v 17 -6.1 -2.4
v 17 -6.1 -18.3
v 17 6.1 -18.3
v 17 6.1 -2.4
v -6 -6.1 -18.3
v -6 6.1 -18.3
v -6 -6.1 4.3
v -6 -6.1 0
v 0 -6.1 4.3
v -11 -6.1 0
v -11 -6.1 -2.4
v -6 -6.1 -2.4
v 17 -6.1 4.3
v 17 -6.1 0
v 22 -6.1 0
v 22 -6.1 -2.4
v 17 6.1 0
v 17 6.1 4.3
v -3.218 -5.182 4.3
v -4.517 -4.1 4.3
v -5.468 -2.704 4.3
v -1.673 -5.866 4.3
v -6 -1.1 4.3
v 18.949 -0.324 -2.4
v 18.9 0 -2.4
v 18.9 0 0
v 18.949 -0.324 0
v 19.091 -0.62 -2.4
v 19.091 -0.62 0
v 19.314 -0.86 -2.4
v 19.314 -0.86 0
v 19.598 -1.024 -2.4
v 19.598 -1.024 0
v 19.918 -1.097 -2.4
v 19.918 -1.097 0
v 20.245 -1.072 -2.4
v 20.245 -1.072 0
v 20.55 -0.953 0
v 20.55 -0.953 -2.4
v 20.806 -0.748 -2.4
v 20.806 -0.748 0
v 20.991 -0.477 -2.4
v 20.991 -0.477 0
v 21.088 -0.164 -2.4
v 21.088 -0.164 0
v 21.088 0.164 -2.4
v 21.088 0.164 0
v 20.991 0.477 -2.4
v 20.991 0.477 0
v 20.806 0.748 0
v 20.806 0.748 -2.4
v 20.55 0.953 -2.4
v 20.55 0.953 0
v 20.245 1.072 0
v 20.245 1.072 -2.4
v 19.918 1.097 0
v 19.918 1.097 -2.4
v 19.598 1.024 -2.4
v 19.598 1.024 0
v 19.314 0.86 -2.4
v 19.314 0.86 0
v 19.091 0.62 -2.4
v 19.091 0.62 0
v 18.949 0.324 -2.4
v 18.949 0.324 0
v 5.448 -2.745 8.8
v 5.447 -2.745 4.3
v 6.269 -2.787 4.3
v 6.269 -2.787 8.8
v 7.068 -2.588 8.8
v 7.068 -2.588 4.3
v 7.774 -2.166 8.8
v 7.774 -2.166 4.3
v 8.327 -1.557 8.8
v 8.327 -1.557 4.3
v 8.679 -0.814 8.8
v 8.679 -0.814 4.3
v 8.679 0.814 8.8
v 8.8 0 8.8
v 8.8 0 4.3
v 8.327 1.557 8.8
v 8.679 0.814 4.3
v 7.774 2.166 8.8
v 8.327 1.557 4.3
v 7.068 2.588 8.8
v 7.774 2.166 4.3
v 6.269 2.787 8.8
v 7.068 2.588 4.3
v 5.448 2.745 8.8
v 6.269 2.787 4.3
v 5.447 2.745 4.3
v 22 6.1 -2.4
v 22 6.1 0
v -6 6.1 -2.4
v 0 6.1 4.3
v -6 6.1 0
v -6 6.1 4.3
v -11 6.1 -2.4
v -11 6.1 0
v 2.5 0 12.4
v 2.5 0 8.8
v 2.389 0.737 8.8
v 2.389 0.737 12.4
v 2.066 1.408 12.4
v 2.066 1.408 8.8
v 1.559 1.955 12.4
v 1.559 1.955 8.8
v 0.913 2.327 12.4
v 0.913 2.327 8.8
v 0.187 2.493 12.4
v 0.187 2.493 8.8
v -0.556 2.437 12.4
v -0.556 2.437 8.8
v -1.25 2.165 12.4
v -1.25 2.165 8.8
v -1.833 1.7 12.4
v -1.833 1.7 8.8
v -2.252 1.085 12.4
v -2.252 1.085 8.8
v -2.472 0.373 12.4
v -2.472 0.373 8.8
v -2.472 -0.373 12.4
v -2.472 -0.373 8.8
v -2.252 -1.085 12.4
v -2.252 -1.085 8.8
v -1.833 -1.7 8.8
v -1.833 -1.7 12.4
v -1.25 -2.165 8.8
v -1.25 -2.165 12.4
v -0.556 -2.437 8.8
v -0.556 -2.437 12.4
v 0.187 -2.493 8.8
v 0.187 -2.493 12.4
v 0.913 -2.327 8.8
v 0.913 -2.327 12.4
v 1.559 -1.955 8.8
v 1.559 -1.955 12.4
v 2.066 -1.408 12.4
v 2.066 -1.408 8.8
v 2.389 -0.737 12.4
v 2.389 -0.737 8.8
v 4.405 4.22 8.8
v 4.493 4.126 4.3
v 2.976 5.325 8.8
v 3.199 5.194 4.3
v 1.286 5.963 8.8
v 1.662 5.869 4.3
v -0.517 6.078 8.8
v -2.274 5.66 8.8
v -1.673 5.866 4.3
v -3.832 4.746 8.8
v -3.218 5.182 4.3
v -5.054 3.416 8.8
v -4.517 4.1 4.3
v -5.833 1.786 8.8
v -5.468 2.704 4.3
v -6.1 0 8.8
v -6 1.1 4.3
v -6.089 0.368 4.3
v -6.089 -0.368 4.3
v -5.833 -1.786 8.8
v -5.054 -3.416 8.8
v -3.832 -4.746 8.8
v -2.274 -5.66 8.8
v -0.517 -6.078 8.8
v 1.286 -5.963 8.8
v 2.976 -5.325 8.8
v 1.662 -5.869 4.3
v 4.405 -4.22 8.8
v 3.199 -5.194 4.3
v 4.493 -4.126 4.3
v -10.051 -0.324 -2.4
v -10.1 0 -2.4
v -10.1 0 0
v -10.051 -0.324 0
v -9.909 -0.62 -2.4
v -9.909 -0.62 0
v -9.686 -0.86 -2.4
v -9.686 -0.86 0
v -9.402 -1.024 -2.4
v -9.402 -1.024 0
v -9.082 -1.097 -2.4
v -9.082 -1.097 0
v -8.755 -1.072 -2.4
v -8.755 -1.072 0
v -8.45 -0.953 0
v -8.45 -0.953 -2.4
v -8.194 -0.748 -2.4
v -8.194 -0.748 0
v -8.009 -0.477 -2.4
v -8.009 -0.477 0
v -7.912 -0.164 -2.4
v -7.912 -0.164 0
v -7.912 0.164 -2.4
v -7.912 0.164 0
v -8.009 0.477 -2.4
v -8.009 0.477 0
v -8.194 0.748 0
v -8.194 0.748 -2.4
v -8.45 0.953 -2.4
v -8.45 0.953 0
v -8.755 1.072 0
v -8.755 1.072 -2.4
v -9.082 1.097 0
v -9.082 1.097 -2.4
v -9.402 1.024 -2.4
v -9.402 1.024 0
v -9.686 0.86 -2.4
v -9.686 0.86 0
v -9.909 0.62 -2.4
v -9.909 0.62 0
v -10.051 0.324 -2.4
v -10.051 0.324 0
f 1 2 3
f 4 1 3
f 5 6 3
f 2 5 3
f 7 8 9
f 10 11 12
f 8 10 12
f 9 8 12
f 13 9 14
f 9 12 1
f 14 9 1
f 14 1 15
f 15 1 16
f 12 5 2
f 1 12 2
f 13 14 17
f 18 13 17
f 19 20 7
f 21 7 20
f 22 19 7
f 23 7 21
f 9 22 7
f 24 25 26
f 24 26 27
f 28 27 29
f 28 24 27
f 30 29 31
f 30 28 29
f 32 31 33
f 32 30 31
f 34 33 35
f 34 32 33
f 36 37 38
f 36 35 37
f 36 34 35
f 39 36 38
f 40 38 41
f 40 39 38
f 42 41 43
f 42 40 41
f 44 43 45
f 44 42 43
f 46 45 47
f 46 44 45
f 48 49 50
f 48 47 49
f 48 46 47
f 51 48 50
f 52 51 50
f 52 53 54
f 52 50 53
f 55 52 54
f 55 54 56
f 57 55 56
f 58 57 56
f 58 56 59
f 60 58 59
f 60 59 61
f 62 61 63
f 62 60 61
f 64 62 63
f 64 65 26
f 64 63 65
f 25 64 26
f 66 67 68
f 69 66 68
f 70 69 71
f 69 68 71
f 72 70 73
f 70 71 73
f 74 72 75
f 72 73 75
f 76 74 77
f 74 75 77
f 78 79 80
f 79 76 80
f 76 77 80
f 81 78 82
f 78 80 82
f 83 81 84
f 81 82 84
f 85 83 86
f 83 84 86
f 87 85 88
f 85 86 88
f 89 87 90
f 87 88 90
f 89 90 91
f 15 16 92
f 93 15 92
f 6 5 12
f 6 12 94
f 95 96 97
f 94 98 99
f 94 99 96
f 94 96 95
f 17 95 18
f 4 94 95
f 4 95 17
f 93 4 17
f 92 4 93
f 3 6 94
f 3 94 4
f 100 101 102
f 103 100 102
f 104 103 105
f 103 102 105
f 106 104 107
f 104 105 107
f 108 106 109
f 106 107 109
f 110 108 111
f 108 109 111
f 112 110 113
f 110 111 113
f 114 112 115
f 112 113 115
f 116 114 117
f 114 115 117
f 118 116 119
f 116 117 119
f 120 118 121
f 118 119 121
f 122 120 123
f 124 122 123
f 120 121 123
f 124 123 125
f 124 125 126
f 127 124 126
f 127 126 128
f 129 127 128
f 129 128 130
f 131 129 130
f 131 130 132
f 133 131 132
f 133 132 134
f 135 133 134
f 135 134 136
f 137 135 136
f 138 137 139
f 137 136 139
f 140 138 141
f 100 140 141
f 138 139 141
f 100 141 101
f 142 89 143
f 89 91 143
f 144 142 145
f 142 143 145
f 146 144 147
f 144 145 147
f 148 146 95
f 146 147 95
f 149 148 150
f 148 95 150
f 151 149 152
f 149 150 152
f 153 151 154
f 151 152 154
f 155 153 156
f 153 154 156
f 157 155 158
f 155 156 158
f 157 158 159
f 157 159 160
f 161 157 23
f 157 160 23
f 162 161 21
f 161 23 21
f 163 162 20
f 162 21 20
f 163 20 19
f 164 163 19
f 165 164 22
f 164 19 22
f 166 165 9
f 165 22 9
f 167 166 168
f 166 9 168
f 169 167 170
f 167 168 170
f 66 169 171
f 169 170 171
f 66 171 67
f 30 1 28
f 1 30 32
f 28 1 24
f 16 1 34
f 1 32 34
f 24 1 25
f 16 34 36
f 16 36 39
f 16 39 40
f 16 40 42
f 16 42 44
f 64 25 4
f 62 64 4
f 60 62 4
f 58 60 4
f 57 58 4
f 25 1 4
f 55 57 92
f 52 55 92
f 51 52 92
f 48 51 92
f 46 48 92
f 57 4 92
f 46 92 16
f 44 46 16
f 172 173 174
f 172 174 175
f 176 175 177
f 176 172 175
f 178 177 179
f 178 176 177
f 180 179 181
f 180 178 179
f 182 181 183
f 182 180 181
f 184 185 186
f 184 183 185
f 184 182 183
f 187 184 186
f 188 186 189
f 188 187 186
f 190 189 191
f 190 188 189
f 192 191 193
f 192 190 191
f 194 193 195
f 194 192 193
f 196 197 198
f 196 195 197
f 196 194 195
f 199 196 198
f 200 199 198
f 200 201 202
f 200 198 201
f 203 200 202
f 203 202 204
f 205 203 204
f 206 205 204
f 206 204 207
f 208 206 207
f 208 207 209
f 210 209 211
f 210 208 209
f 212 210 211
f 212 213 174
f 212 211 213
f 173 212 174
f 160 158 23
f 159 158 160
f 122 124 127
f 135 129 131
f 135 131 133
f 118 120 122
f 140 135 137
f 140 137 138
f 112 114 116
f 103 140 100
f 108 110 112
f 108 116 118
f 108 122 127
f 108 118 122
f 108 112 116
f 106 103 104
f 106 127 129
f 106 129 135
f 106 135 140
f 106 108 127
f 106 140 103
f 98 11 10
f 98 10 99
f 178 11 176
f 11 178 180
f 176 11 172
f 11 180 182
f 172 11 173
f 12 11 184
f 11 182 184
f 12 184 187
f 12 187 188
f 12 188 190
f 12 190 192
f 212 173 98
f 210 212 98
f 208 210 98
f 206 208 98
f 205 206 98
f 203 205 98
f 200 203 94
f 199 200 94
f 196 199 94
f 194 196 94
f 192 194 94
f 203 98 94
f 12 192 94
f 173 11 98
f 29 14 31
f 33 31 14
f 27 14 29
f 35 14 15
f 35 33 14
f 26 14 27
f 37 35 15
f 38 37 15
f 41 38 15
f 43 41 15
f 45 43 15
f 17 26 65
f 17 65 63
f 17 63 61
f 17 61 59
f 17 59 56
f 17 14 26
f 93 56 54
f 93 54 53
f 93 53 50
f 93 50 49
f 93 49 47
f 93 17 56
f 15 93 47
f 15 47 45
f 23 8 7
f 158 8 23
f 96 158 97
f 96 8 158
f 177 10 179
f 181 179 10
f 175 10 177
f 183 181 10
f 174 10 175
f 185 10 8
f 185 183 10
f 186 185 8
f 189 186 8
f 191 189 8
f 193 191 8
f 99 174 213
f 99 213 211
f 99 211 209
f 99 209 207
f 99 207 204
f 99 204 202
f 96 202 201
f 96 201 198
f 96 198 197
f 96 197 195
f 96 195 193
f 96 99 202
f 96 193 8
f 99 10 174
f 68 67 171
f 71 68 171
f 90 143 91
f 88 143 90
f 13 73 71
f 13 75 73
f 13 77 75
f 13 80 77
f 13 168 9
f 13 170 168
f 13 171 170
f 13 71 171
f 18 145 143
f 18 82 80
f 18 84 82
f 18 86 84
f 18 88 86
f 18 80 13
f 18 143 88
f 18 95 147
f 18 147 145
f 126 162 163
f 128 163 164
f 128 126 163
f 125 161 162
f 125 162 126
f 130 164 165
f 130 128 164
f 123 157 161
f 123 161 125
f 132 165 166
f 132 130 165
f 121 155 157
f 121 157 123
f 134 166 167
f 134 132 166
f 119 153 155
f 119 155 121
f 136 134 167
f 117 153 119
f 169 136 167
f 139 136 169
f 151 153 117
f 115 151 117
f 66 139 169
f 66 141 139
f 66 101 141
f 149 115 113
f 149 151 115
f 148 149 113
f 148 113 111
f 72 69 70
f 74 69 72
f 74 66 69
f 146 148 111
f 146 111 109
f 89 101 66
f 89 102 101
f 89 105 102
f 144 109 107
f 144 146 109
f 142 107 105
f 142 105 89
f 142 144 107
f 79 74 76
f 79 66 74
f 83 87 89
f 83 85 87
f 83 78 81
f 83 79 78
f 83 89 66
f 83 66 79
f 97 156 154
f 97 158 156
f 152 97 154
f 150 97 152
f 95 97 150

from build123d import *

# Parameters (mm, degrees)
CASE_CONSERVATIVE_PLAN_23X12P2_START     = -18.3
CASE_CONSERVATIVE_PLAN_23X12P2_PROFILE_W = 23
CASE_CONSERVATIVE_PLAN_23X12P2_PROFILE_H = 12.2
CASE_CONSERVATIVE_PLAN_23X12P2_DEPTH     = 22.6
MOUNTING_EARS_33X12P2_START              = -2.4
MOUNTING_EARS_33X12P2_PROFILE_W          = 33
MOUNTING_EARS_33X12P2_PROFILE_H          = 12.2
MOUNTING_EARS_33X12P2_DEPTH              = 2.4
RAISED_GEAR_COVER_ENVELOPE_START         = 4.3
RAISED_GEAR_COVER_ENVELOPE_PROFILE_R     = 6.1
RAISED_GEAR_COVER_ENVELOPE_DEPTH         = 4.5
SECONDARY_GEAR_COVER_ENVELOPE_START      = 4.3
SECONDARY_GEAR_COVER_ENVELOPE_PROFILE_R  = 2.8
SECONDARY_GEAR_COVER_ENVELOPE_DEPTH      = 4.5
OUTPUT_ENVELOPE_NOT_SPLINE_START         = 8.8
OUTPUT_ENVELOPE_NOT_SPLINE_PROFILE_R     = 2.5
OUTPUT_ENVELOPE_NOT_SPLINE_DEPTH         = 3.6
MOUNTING_HOLES_NOMINAL_START             = -50
MOUNTING_HOLES_NOMINAL_PROFILE_R         = 1.1
MOUNTING_HOLES_NOMINAL_DEPTH             = 80.259186592


with BuildPart() as part:
    # Case_conservative_plan_23x12p2_profile → Case_conservative_plan_23x12p2 (new body)
    with BuildSketch(Plane.XY.offset(CASE_CONSERVATIVE_PLAN_23X12P2_START)):
        with Locations((5.5, 0)):
            Rectangle(CASE_CONSERVATIVE_PLAN_23X12P2_PROFILE_W, CASE_CONSERVATIVE_PLAN_23X12P2_PROFILE_H)
    extrude(amount=CASE_CONSERVATIVE_PLAN_23X12P2_DEPTH)

    # Mounting_ears_33x12p2_profile → Mounting_ears_33x12p2 (add)
    with BuildSketch(Plane.XY.offset(MOUNTING_EARS_33X12P2_START)):
        with Locations((5.5, 0)):
            Rectangle(MOUNTING_EARS_33X12P2_PROFILE_W, MOUNTING_EARS_33X12P2_PROFILE_H)
    extrude(amount=MOUNTING_EARS_33X12P2_DEPTH)

    # Raised_gear_cover_envelope_profile → Raised_gear_cover_envelope (add)
    with BuildSketch(Plane.XY.offset(RAISED_GEAR_COVER_ENVELOPE_START)):
        with Locations(Location((0, 0, 0), (0, 0, 169.611142185))):
            Circle(RAISED_GEAR_COVER_ENVELOPE_PROFILE_R)
    extrude(amount=RAISED_GEAR_COVER_ENVELOPE_DEPTH)

    # Secondary_gear_cover_envelope_profile → Secondary_gear_cover_envelope (add)
    with BuildSketch(Plane.XY.offset(SECONDARY_GEAR_COVER_ENVELOPE_START)):
        with Locations((6, 0)):
            Circle(SECONDARY_GEAR_COVER_ENVELOPE_PROFILE_R)
    extrude(amount=SECONDARY_GEAR_COVER_ENVELOPE_DEPTH)

    # Output_envelope_not_spline_profile → Output_envelope_not_spline (add)
    with BuildSketch(Plane.XY.offset(OUTPUT_ENVELOPE_NOT_SPLINE_START)):
        Circle(OUTPUT_ENVELOPE_NOT_SPLINE_PROFILE_R)
    extrude(amount=OUTPUT_ENVELOPE_NOT_SPLINE_DEPTH)

    # Mounting_holes_nominal_profile → Mounting_holes_nominal (cut, through all)
    with BuildSketch(Plane.XY.offset(MOUNTING_HOLES_NOMINAL_START)):
        with Locations(Location((-9, 0, 0), (0, 0, 180))):
            Circle(MOUNTING_HOLES_NOMINAL_PROFILE_R)
        with Locations(Location((20, 0, 0), (0, 0, 180))):
            Circle(MOUNTING_HOLES_NOMINAL_PROFILE_R)
    extrude(amount=MOUNTING_HOLES_NOMINAL_DEPTH, mode=Mode.SUBTRACT)


solid = part.part
